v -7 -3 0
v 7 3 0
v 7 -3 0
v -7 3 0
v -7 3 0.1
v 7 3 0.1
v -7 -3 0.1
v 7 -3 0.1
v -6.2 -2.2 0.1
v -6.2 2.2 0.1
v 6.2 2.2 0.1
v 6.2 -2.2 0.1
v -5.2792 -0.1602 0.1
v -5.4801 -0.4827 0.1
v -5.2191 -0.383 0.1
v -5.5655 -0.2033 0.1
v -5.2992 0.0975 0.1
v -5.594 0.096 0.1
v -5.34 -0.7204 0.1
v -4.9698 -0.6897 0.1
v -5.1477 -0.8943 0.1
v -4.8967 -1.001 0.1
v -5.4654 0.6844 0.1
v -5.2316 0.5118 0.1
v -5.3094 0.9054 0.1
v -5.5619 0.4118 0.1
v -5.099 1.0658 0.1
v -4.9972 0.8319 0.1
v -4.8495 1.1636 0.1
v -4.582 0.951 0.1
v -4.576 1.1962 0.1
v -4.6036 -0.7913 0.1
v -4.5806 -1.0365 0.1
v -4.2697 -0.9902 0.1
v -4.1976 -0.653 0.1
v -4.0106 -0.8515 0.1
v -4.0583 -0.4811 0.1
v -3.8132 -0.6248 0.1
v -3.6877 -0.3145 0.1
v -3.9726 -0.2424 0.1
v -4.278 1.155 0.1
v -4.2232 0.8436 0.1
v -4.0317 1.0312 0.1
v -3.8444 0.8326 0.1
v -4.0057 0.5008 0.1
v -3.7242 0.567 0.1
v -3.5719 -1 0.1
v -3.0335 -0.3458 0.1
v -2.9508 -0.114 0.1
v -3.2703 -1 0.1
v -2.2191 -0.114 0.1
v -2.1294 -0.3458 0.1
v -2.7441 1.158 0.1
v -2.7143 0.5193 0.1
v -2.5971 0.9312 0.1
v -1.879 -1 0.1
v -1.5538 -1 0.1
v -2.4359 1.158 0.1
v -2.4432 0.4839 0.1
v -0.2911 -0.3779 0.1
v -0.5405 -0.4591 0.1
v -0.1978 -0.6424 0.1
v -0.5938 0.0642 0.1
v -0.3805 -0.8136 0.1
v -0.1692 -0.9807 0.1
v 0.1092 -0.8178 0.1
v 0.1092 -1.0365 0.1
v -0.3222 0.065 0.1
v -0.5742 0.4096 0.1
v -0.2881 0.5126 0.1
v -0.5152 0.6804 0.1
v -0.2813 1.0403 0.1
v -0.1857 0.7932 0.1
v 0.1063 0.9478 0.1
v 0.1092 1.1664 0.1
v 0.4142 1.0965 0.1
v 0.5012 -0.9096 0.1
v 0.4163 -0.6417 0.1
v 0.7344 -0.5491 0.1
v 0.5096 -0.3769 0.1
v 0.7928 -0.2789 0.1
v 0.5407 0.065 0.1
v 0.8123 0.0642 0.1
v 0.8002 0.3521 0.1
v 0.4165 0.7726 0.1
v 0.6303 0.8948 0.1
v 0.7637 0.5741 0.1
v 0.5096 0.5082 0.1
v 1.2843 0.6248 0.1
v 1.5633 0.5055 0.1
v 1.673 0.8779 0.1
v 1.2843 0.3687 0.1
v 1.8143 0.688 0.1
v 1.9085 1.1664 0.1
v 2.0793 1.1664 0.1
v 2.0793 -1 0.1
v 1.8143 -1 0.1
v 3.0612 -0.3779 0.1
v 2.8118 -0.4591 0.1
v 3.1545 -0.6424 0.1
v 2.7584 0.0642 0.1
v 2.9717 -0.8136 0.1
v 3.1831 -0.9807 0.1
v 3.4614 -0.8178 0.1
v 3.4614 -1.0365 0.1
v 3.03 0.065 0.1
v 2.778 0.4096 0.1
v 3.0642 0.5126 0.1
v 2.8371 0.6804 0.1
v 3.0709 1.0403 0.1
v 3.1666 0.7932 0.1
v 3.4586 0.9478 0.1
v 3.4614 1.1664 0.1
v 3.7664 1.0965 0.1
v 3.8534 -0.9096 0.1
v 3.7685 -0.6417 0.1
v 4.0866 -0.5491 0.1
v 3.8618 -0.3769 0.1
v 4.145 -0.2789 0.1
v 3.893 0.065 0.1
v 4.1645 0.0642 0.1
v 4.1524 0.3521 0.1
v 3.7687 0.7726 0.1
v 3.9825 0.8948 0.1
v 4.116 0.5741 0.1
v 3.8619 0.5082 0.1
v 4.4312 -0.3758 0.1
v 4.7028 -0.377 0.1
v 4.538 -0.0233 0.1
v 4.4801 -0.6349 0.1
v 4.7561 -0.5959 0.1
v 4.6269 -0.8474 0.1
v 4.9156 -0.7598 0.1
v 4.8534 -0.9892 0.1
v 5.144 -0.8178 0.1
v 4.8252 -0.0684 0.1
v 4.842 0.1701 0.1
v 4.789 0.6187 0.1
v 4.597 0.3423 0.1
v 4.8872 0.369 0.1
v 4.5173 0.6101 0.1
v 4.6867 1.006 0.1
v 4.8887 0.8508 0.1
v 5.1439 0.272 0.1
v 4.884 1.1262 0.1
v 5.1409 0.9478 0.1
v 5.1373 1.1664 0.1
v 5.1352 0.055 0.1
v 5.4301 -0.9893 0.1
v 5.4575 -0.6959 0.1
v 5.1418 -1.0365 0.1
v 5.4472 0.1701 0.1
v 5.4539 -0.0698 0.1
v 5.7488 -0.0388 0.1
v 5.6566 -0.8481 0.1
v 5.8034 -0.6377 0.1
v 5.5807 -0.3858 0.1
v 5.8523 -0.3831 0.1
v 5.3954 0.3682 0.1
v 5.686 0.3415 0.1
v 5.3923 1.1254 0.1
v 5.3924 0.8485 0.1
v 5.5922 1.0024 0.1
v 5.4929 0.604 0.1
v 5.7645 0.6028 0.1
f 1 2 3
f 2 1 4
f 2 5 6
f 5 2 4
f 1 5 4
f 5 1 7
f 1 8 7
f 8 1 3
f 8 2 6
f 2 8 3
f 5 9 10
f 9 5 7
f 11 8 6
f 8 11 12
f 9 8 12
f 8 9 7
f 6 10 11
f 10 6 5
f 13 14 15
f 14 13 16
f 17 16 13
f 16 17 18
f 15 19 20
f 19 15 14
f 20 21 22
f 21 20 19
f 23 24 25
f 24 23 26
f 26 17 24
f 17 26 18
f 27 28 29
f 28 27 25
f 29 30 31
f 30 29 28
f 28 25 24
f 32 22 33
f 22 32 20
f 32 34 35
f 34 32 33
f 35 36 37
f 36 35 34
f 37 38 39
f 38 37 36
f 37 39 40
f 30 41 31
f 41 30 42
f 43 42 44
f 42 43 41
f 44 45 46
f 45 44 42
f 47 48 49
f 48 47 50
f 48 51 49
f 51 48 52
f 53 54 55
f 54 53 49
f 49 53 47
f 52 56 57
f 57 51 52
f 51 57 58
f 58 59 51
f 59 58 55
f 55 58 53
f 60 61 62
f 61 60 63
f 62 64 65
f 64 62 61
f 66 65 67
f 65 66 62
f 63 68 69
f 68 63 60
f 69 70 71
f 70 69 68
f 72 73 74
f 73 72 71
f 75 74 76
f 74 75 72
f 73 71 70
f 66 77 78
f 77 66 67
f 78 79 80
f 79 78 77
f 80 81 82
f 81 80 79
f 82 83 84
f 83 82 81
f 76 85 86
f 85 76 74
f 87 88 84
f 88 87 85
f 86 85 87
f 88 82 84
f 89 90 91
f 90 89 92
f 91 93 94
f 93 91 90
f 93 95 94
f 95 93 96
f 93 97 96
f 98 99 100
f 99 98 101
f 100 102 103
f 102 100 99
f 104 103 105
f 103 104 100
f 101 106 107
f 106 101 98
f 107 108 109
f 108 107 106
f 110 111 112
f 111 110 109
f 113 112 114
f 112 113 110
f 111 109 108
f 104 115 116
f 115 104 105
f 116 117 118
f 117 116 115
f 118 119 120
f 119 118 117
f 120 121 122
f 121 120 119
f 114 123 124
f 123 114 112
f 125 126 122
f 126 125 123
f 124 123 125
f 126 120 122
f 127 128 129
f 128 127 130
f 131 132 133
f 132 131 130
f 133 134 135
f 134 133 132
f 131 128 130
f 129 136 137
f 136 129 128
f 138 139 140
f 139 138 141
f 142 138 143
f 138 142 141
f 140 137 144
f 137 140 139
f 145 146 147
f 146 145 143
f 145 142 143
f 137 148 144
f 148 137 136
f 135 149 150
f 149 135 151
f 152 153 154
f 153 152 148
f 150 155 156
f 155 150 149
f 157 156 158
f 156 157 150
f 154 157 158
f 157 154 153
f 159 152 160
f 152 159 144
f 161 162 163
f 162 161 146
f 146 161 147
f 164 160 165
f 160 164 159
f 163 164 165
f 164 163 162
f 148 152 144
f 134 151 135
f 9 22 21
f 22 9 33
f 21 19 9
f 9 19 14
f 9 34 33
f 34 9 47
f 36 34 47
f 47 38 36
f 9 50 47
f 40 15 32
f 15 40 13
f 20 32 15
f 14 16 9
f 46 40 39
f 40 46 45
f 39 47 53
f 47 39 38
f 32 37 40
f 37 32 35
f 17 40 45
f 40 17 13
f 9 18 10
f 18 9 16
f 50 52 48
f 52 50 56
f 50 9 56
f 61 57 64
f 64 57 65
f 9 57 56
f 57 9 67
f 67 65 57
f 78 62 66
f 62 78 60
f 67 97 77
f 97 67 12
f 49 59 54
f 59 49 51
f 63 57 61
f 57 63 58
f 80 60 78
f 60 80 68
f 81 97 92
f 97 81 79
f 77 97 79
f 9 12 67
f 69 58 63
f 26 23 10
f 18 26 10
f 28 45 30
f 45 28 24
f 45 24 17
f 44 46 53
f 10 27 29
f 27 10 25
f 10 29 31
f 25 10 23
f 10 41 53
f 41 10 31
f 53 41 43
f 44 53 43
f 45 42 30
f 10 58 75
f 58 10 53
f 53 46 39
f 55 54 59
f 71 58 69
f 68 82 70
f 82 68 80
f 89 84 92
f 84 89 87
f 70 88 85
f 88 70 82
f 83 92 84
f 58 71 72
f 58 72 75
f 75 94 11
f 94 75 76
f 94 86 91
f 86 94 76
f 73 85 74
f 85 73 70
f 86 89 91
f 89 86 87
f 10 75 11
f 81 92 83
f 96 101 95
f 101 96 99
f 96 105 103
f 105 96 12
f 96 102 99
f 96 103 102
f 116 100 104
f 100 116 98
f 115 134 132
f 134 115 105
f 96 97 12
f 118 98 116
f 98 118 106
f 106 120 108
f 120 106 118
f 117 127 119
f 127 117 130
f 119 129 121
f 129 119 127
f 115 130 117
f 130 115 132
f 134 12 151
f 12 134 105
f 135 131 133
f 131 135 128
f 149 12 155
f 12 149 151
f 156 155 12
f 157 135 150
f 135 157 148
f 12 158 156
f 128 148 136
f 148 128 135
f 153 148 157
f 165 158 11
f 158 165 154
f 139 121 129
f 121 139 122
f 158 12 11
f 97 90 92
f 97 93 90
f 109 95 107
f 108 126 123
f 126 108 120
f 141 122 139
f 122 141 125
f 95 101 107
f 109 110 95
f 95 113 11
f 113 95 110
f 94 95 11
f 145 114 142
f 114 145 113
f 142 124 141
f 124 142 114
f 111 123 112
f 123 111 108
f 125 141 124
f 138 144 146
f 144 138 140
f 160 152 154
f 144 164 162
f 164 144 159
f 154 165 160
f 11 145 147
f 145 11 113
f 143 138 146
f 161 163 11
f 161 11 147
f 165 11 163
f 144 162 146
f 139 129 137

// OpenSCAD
// file: ../p/box5-12.scad
use <../lib.scad>
function ldraw_lib__box5_12() = [
// 0 Box with 5 Faces without Any Edges
// 0 Name: box5-12.dat
// 0 Author: Chris Dee [cwdee]
// 0 !LDRAW_ORG Primitive UPDATE 2009-02
// 0 !LICENSE Licensed under CC BY 2.0 and CC BY 4.0 : see CAreadme.txt
// 
// 0 BFC CERTIFY CCW
  [0,"BFC","CERTIFY"],
  [0,"BFC","CCW"],
// 
// 0 !HISTORY 2009-09-03 [PTadmin] Official Update 2009-02
// 
// 
// 4 16 1 1 1 1 1 -1 -1 1 -1 -1 1 1
  [4,16,1,1,1,1,1,-1,-1,1,-1,-1,1,1],
// 4 16 -1 0 1 1 0 1 1 1 1 -1 1 1
  [4,16,-1,0,1,1,0,1,1,1,1,-1,1,1],
// 4 16 -1 0 -1 -1 0 1 -1 1 1 -1 1 -1
  [4,16,-1,0,-1,-1,0,1,-1,1,1,-1,1,-1],
// 4 16 1 0 -1 -1 0 -1 -1 1 -1 1 1 -1
  [4,16,1,0,-1,-1,0,-1,-1,1,-1,1,1,-1],
// 4 16 1 0 1 1 0 -1 1 1 -1 1 1 1
  [4,16,1,0,1,1,0,-1,1,1,-1,1,1,1],
// 0
];
module ldraw_lib__box5_12(step=0, col=false, unit=2/5, alt=false, line=0.2, solid=!$preview)
    makepoly(ldraw_lib__box5_12(), step=step, col=col, unit=unit, alt=alt, line=line, solid=solid);
ldraw_lib__box5_12(line=0.2);
// main file
use <../lib.scad>
use <../p/box5-12.scad>
function ldraw_lib__4521703f() = [
// 0 Sticker  0.8 x  1.8 with Black "CA 0108" and Border
// 0 Name: 4521703f.dat
// 0 Author: J.C. Tchang [tchang]
// 0 !LDRAW_ORG Part UPDATE 2012-01
// 0 !LICENSE Licensed under CC BY 2.0 and CC BY 4.0 : see CAreadme.txt
// 
// 0 BFC CERTIFY CCW
  [0,"BFC","CERTIFY"],
  [0,"BFC","CCW"],
// 
// 0 !HISTORY 2011-07-25 [PTadmin] Official Update 2011-01
// 0 !HISTORY 2012-01-09 [cwdee] Corrected dimensions
// 0 !HISTORY 2012-03-30 [PTadmin] Official Update 2012-01
// 
// 
// 1 16 0 -0.25 0 17.5 0 0 0 0.25 0 0 0 7.5 box5-12.dat
  [1,16,0,-0.25,0,17.5,0,0,0,0.25,0,0,0,7.5, ldraw_lib__box5_12()],
// 4 0 -15.5 -0.25 -5.5 -15.5 -0.25 5.5 -17.5 -0.25 7.5 -17.5 -0.25 -7.5
  [4,0,-15.5,-0.25,-5.5,-15.5,-0.25,5.5,-17.5,-0.25,7.5,-17.5,-0.25,-7.5],
// 4 0 15.5 -0.25 5.5 15.5 -0.25 -5.5 17.5 -0.25 -7.5 17.5 -0.25 7.5
  [4,0,15.5,-0.25,5.5,15.5,-0.25,-5.5,17.5,-0.25,-7.5,17.5,-0.25,7.5],
// 4 0 15.5 -0.25 -5.5 -15.5 -0.25 -5.5 -17.5 -0.25 -7.5 17.5 -0.25 -7.5
  [4,0,15.5,-0.25,-5.5,-15.5,-0.25,-5.5,-17.5,-0.25,-7.5,17.5,-0.25,-7.5],
// 4 0 -15.5 -0.25 5.5 15.5 -0.25 5.5 17.5 -0.25 7.5 -17.5 -0.25 7.5
  [4,0,-15.5,-0.25,5.5,15.5,-0.25,5.5,17.5,-0.25,7.5,-17.5,-0.25,7.5],
// 0 //
// 4 0 -13.7002 -0.25 -1.2068 -13.0478 -0.25 -0.9574 -13.198 -0.25 -0.4004 -13.9138 -0.25 -0.5083
  [4,0,-13.7002,-0.25,-1.2068,-13.0478,-0.25,-0.9574,-13.198,-0.25,-0.4004,-13.9138,-0.25,-0.5083],
// 4 0 -13.9138 -0.25 -0.5083 -13.198 -0.25 -0.4004 -13.2481 -0.25 0.2438 -13.9851 -0.25 0.2401
  [4,0,-13.9138,-0.25,-0.5083,-13.198,-0.25,-0.4004,-13.2481,-0.25,0.2438,-13.9851,-0.25,0.2401],
// 4 0 -13.0478 -0.25 -0.9574 -13.7002 -0.25 -1.2068 -13.3499 -0.25 -1.8009 -12.4245 -0.25 -1.7243
  [4,0,-13.0478,-0.25,-0.9574,-13.7002,-0.25,-1.2068,-13.3499,-0.25,-1.8009,-12.4245,-0.25,-1.7243],
// 4 0 -12.8692 -0.25 -2.2358 -12.2417 -0.25 -2.5024 -12.4245 -0.25 -1.7243 -13.3499 -0.25 -1.8009
  [4,0,-12.8692,-0.25,-2.2358,-12.2417,-0.25,-2.5024,-12.4245,-0.25,-1.7243,-13.3499,-0.25,-1.8009],
// 4 0 -13.6634 -0.25 1.7111 -13.9048 -0.25 1.0295 -13.0791 -0.25 1.2794 -13.2736 -0.25 2.2634
  [4,0,-13.6634,-0.25,1.7111,-13.9048,-0.25,1.0295,-13.0791,-0.25,1.2794,-13.2736,-0.25,2.2634],
// 4 0 -13.9048 -0.25 1.0295 -13.9851 -0.25 0.2401 -13.2481 -0.25 0.2438 -13.0791 -0.25 1.2794
  [4,0,-13.9048,-0.25,1.0295,-13.9851,-0.25,0.2401,-13.2481,-0.25,0.2438,-13.0791,-0.25,1.2794],
// 4 0 -12.4929 -0.25 2.0797 -12.1237 -0.25 2.9089 -12.7475 -0.25 2.6646 -13.2736 -0.25 2.2634
  [4,0,-12.4929,-0.25,2.0797,-12.1237,-0.25,2.9089,-12.7475,-0.25,2.6646,-13.2736,-0.25,2.2634],
// 4 0 -12.1237 -0.25 2.9089 -12.4929 -0.25 2.0797 -11.4549 -0.25 2.3776 -11.44 -0.25 2.9905
  [4,0,-12.1237,-0.25,2.9089,-12.4929,-0.25,2.0797,-11.4549,-0.25,2.3776,-11.44,-0.25,2.9905],
// 3 0 -12.4929 -0.25 2.0797 -13.2736 -0.25 2.2634 -13.0791 -0.25 1.2794
  [3,0,-12.4929,-0.25,2.0797,-13.2736,-0.25,2.2634,-13.0791,-0.25,1.2794],
// 4 0 -11.5089 -0.25 -1.9782 -12.4245 -0.25 -1.7243 -12.2417 -0.25 -2.5024 -11.4514 -0.25 -2.5912
  [4,0,-11.5089,-0.25,-1.9782,-12.4245,-0.25,-1.7243,-12.2417,-0.25,-2.5024,-11.4514,-0.25,-2.5912],
// 4 0 -11.5089 -0.25 -1.9782 -11.4514 -0.25 -2.5912 -10.6742 -0.25 -2.4754 -10.494 -0.25 -1.6324
  [4,0,-11.5089,-0.25,-1.9782,-11.4514,-0.25,-2.5912,-10.6742,-0.25,-2.4754,-10.494,-0.25,-1.6324],
// 4 0 -10.494 -0.25 -1.6324 -10.6742 -0.25 -2.4754 -10.0265 -0.25 -2.1287 -10.1458 -0.25 -1.2028
  [4,0,-10.494,-0.25,-1.6324,-10.6742,-0.25,-2.4754,-10.0265,-0.25,-2.1287,-10.1458,-0.25,-1.2028],
// 4 0 -10.1458 -0.25 -1.2028 -10.0265 -0.25 -2.1287 -9.5331 -0.25 -1.5619 -9.2193 -0.25 -0.7862
  [4,0,-10.1458,-0.25,-1.2028,-10.0265,-0.25,-2.1287,-9.5331,-0.25,-1.5619,-9.2193,-0.25,-0.7862],
// 3 0 -10.1458 -0.25 -1.2028 -9.2193 -0.25 -0.7862 -9.9314 -0.25 -0.606
  [3,0,-10.1458,-0.25,-1.2028,-9.2193,-0.25,-0.7862,-9.9314,-0.25,-0.606],
// 4 0 -11.4549 -0.25 2.3776 -10.5581 -0.25 2.1091 -10.6951 -0.25 2.8874 -11.44 -0.25 2.9905
  [4,0,-11.4549,-0.25,2.3776,-10.5581,-0.25,2.1091,-10.6951,-0.25,2.8874,-11.44,-0.25,2.9905],
// 4 0 -10.0793 -0.25 2.5779 -10.6951 -0.25 2.8874 -10.5581 -0.25 2.1091 -9.611 -0.25 2.0816
  [4,0,-10.0793,-0.25,2.5779,-10.6951,-0.25,2.8874,-10.5581,-0.25,2.1091,-9.611,-0.25,2.0816],
// 4 0 -9.611 -0.25 2.0816 -10.5581 -0.25 2.1091 -10.0143 -0.25 1.2519 -9.3105 -0.25 1.4175
  [4,0,-9.611,-0.25,2.0816,-10.5581,-0.25,2.1091,-10.0143,-0.25,1.2519,-9.3105,-0.25,1.4175],
// 4 0 -8.9297 -0.25 -2.5 -8.1758 -0.25 -2.5 -7.5837 -0.25 -0.8644 -7.377 -0.25 -0.2849
  [4,0,-8.9297,-0.25,-2.5,-8.1758,-0.25,-2.5,-7.5837,-0.25,-0.8644,-7.377,-0.25,-0.2849],
// 4 0 -5.5478 -0.25 -0.2849 -7.377 -0.25 -0.2849 -7.5837 -0.25 -0.8644 -5.3236 -0.25 -0.8644
  [4,0,-5.5478,-0.25,-0.2849,-7.377,-0.25,-0.2849,-7.5837,-0.25,-0.8644,-5.3236,-0.25,-0.8644],
// 4 0 -6.8603 -0.25 2.8951 -7.377 -0.25 -0.2849 -6.7858 -0.25 1.2982 -6.4927 -0.25 2.328
  [4,0,-6.8603,-0.25,2.8951,-7.377,-0.25,-0.2849,-6.7858,-0.25,1.2982,-6.4927,-0.25,2.328],
// 3 0 -7.377 -0.25 -0.2849 -6.8603 -0.25 2.8951 -8.9297 -0.25 -2.5
  [3,0,-7.377,-0.25,-0.2849,-6.8603,-0.25,2.8951,-8.9297,-0.25,-2.5],
// 3 0 -5.3236 -0.25 -0.8644 -4.6976 -0.25 -2.5 -3.8846 -0.25 -2.5
  [3,0,-5.3236,-0.25,-0.8644,-4.6976,-0.25,-2.5,-3.8846,-0.25,-2.5],
// 4 0 -5.5478 -0.25 -0.2849 -5.3236 -0.25 -0.8644 -3.8846 -0.25 -2.5 -6.0897 -0.25 2.8951
  [4,0,-5.5478,-0.25,-0.2849,-5.3236,-0.25,-0.8644,-3.8846,-0.25,-2.5,-6.0897,-0.25,2.8951],
// 4 0 -6.0897 -0.25 2.8951 -6.4927 -0.25 2.328 -6.108 -0.25 1.2097 -5.5478 -0.25 -0.2849
  [4,0,-6.0897,-0.25,2.8951,-6.4927,-0.25,2.328,-6.108,-0.25,1.2097,-5.5478,-0.25,-0.2849],
// 3 0 -6.4927 -0.25 2.328 -6.0897 -0.25 2.8951 -6.8603 -0.25 2.8951
  [3,0,-6.4927,-0.25,2.328,-6.0897,-0.25,2.8951,-6.8603,-0.25,2.8951],
// 4 0 -0.7277 -0.25 -0.9447 -1.4845 -0.25 0.1606 -1.3512 -0.25 -1.1477 -0.4945 -0.25 -1.6059
  [4,0,-0.7277,-0.25,-0.9447,-1.4845,-0.25,0.1606,-1.3512,-0.25,-1.1477,-0.4945,-0.25,-1.6059],
// 4 0 -0.4945 -0.25 -1.6059 -1.3512 -0.25 -1.1477 -0.9513 -0.25 -2.0339 -0.4229 -0.25 -2.4518
  [4,0,-0.4945,-0.25,-1.6059,-1.3512,-0.25,-1.1477,-0.9513,-0.25,-2.0339,-0.4229,-0.25,-2.4518],
// 4 0 0.273 -0.25 -2.0445 -0.4945 -0.25 -1.6059 -0.4229 -0.25 -2.4518 0.273 -0.25 -2.5912
  [4,0,0.273,-0.25,-2.0445,-0.4945,-0.25,-1.6059,-0.4229,-0.25,-2.4518,0.273,-0.25,-2.5912],
// 4 0 -1.4845 -0.25 0.1606 -0.7277 -0.25 -0.9447 -0.8056 -0.25 0.1625 -1.4355 -0.25 1.024
  [4,0,-1.4845,-0.25,0.1606,-0.7277,-0.25,-0.9447,-0.8056,-0.25,0.1625,-1.4355,-0.25,1.024],
// 4 0 -0.7203 -0.25 1.2815 -1.2879 -0.25 1.701 -1.4355 -0.25 1.024 -0.8056 -0.25 0.1625
  [4,0,-0.7203,-0.25,1.2815,-1.2879,-0.25,1.701,-1.4355,-0.25,1.024,-0.8056,-0.25,0.1625],
// 4 0 -0.7033 -0.25 2.6007 -1.2879 -0.25 1.701 -0.4643 -0.25 1.983 0.2658 -0.25 2.3694
  [4,0,-0.7033,-0.25,2.6007,-1.2879,-0.25,1.701,-0.4643,-0.25,1.983,0.2658,-0.25,2.3694],
// 4 0 0.273 -0.25 2.9161 -0.7033 -0.25 2.6007 0.2658 -0.25 2.3694 1.0354 -0.25 2.7412
  [4,0,0.273,-0.25,2.9161,-0.7033,-0.25,2.6007,0.2658,-0.25,2.3694,1.0354,-0.25,2.7412],
// 3 0 -0.4643 -0.25 1.983 -1.2879 -0.25 1.701 -0.7203 -0.25 1.2815
  [3,0,-0.4643,-0.25,1.983,-1.2879,-0.25,1.701,-0.7203,-0.25,1.2815],
// 4 0 1.2529 -0.25 -2.274 1.0407 -0.25 -1.6043 0.273 -0.25 -2.0445 0.273 -0.25 -2.5912
  [4,0,1.2529,-0.25,-2.274,1.0407,-0.25,-1.6043,0.273,-0.25,-2.0445,0.273,-0.25,-2.5912],
// 4 0 1.0407 -0.25 -1.6043 1.2529 -0.25 -2.274 1.8359 -0.25 -1.3727 1.2739 -0.25 -0.9423
  [4,0,1.0407,-0.25,-1.6043,1.2529,-0.25,-2.274,1.8359,-0.25,-1.3727,1.2739,-0.25,-0.9423],
// 4 0 1.2739 -0.25 -0.9423 1.8359 -0.25 -1.3727 1.982 -0.25 -0.6972 1.3518 -0.25 0.1625
  [4,0,1.2739,-0.25,-0.9423,1.8359,-0.25,-1.3727,1.982,-0.25,-0.6972,1.3518,-0.25,0.1625],
// 4 0 1.3518 -0.25 0.1625 1.982 -0.25 -0.6972 2.0307 -0.25 0.1606 2.0005 -0.25 0.8803
  [4,0,1.3518,-0.25,0.1625,1.982,-0.25,-0.6972,2.0307,-0.25,0.1606,2.0005,-0.25,0.8803],
// 4 0 1.0412 -0.25 1.9316 1.5757 -0.25 2.2371 1.0354 -0.25 2.7412 0.2658 -0.25 2.3694
  [4,0,1.0412,-0.25,1.9316,1.5757,-0.25,2.2371,1.0354,-0.25,2.7412,0.2658,-0.25,2.3694],
// 4 0 1.9093 -0.25 1.4353 1.0412 -0.25 1.9316 1.2741 -0.25 1.2704 2.0005 -0.25 0.8803
  [4,0,1.9093,-0.25,1.4353,1.0412,-0.25,1.9316,1.2741,-0.25,1.2704,2.0005,-0.25,0.8803],
// 3 0 1.5757 -0.25 2.2371 1.0412 -0.25 1.9316 1.9093 -0.25 1.4353
  [3,0,1.5757,-0.25,2.2371,1.0412,-0.25,1.9316,1.9093,-0.25,1.4353],
// 3 0 1.2741 -0.25 1.2704 1.3518 -0.25 0.1625 2.0005 -0.25 0.8803
  [3,0,1.2741,-0.25,1.2704,1.3518,-0.25,0.1625,2.0005,-0.25,0.8803],
// 4 0 3.2108 -0.25 1.5619 3.2108 -0.25 0.9217 3.9082 -0.25 1.2638 4.1825 -0.25 2.1947
  [4,0,3.2108,-0.25,1.5619,3.2108,-0.25,0.9217,3.9082,-0.25,1.2638,4.1825,-0.25,2.1947],
// 4 0 4.1825 -0.25 2.1947 3.9082 -0.25 1.2638 4.5358 -0.25 1.7201 4.7713 -0.25 2.9161
  [4,0,4.1825,-0.25,2.1947,3.9082,-0.25,1.2638,4.5358,-0.25,1.7201,4.7713,-0.25,2.9161],
// 4 0 5.1983 -0.25 2.9161 4.7713 -0.25 2.9161 4.5358 -0.25 1.7201 5.1983 -0.25 -2.5
  [4,0,5.1983,-0.25,2.9161,4.7713,-0.25,2.9161,4.5358,-0.25,1.7201,5.1983,-0.25,-2.5],
// 3 0 4.5358 -0.25 1.7201 4.5358 -0.25 -2.5 5.1983 -0.25 -2.5
  [3,0,4.5358,-0.25,1.7201,4.5358,-0.25,-2.5,5.1983,-0.25,-2.5],
// 4 0 7.653 -0.25 -0.9447 6.8961 -0.25 0.1606 7.0294 -0.25 -1.1477 7.8862 -0.25 -1.6059
  [4,0,7.653,-0.25,-0.9447,6.8961,-0.25,0.1606,7.0294,-0.25,-1.1477,7.8862,-0.25,-1.6059],
// 4 0 7.8862 -0.25 -1.6059 7.0294 -0.25 -1.1477 7.4293 -0.25 -2.0339 7.9577 -0.25 -2.4518
  [4,0,7.8862,-0.25,-1.6059,7.0294,-0.25,-1.1477,7.4293,-0.25,-2.0339,7.9577,-0.25,-2.4518],
// 4 0 8.6536 -0.25 -2.0445 7.8862 -0.25 -1.6059 7.9577 -0.25 -2.4518 8.6536 -0.25 -2.5912
  [4,0,8.6536,-0.25,-2.0445,7.8862,-0.25,-1.6059,7.9577,-0.25,-2.4518,8.6536,-0.25,-2.5912],
// 4 0 6.8961 -0.25 0.1606 7.653 -0.25 -0.9447 7.575 -0.25 0.1625 6.9451 -0.25 1.024
  [4,0,6.8961,-0.25,0.1606,7.653,-0.25,-0.9447,7.575,-0.25,0.1625,6.9451,-0.25,1.024],
// 4 0 7.6604 -0.25 1.2815 7.0927 -0.25 1.701 6.9451 -0.25 1.024 7.575 -0.25 0.1625
  [4,0,7.6604,-0.25,1.2815,7.0927,-0.25,1.701,6.9451,-0.25,1.024,7.575,-0.25,0.1625],
// 4 0 7.6773 -0.25 2.6007 7.0927 -0.25 1.701 7.9164 -0.25 1.983 8.6464 -0.25 2.3694
  [4,0,7.6773,-0.25,2.6007,7.0927,-0.25,1.701,7.9164,-0.25,1.983,8.6464,-0.25,2.3694],
// 4 0 8.6536 -0.25 2.9161 7.6773 -0.25 2.6007 8.6464 -0.25 2.3694 9.416 -0.25 2.7412
  [4,0,8.6536,-0.25,2.9161,7.6773,-0.25,2.6007,8.6464,-0.25,2.3694,9.416,-0.25,2.7412],
// 3 0 7.9164 -0.25 1.983 7.0927 -0.25 1.701 7.6604 -0.25 1.2815
  [3,0,7.9164,-0.25,1.983,7.0927,-0.25,1.701,7.6604,-0.25,1.2815],
// 4 0 9.6336 -0.25 -2.274 9.4213 -0.25 -1.6043 8.6536 -0.25 -2.0445 8.6536 -0.25 -2.5912
  [4,0,9.6336,-0.25,-2.274,9.4213,-0.25,-1.6043,8.6536,-0.25,-2.0445,8.6536,-0.25,-2.5912],
// 4 0 9.4213 -0.25 -1.6043 9.6336 -0.25 -2.274 10.2166 -0.25 -1.3727 9.6545 -0.25 -0.9423
  [4,0,9.4213,-0.25,-1.6043,9.6336,-0.25,-2.274,10.2166,-0.25,-1.3727,9.6545,-0.25,-0.9423],
// 4 0 9.6545 -0.25 -0.9423 10.2166 -0.25 -1.3727 10.3626 -0.25 -0.6972 9.7324 -0.25 0.1625
  [4,0,9.6545,-0.25,-0.9423,10.2166,-0.25,-1.3727,10.3626,-0.25,-0.6972,9.7324,-0.25,0.1625],
// 4 0 9.7324 -0.25 0.1625 10.3626 -0.25 -0.6972 10.4113 -0.25 0.1606 10.3811 -0.25 0.8803
  [4,0,9.7324,-0.25,0.1625,10.3626,-0.25,-0.6972,10.4113,-0.25,0.1606,10.3811,-0.25,0.8803],
// 4 0 9.4218 -0.25 1.9316 9.9563 -0.25 2.2371 9.416 -0.25 2.7412 8.6464 -0.25 2.3694
  [4,0,9.4218,-0.25,1.9316,9.9563,-0.25,2.2371,9.416,-0.25,2.7412,8.6464,-0.25,2.3694],
// 4 0 10.29 -0.25 1.4353 9.4218 -0.25 1.9316 9.6548 -0.25 1.2704 10.3811 -0.25 0.8803
  [4,0,10.29,-0.25,1.4353,9.4218,-0.25,1.9316,9.6548,-0.25,1.2704,10.3811,-0.25,0.8803],
// 3 0 9.9563 -0.25 2.2371 9.4218 -0.25 1.9316 10.29 -0.25 1.4353
  [3,0,9.9563,-0.25,2.2371,9.4218,-0.25,1.9316,10.29,-0.25,1.4353],
// 3 0 9.6548 -0.25 1.2704 9.7324 -0.25 0.1625 10.3811 -0.25 0.8803
  [3,0,9.6548,-0.25,1.2704,9.7324,-0.25,0.1625,10.3811,-0.25,0.8803],
// 4 0 11.0781 -0.25 -0.9394 11.2002 -0.25 -1.5873 11.757 -0.25 -0.9426 11.3449 -0.25 -0.0583
  [4,0,11.0781,-0.25,-0.9394,11.2002,-0.25,-1.5873,11.757,-0.25,-0.9426,11.3449,-0.25,-0.0583],
// 4 0 11.8903 -0.25 -1.4898 11.2002 -0.25 -1.5873 11.5673 -0.25 -2.1184 12.2891 -0.25 -1.8995
  [4,0,11.8903,-0.25,-1.4898,11.2002,-0.25,-1.5873,11.5673,-0.25,-2.1184,12.2891,-0.25,-1.8995],
// 4 0 12.1336 -0.25 -2.473 12.8599 -0.25 -2.0445 12.2891 -0.25 -1.8995 11.5673 -0.25 -2.1184
  [4,0,12.1336,-0.25,-2.473,12.8599,-0.25,-2.0445,12.2891,-0.25,-1.8995,11.5673,-0.25,-2.1184],
// 3 0 11.8903 -0.25 -1.4898 11.757 -0.25 -0.9426 11.2002 -0.25 -1.5873
  [3,0,11.8903,-0.25,-1.4898,11.757,-0.25,-0.9426,11.2002,-0.25,-1.5873],
// 4 0 11.3449 -0.25 -0.0583 11.757 -0.25 -0.9426 12.0631 -0.25 -0.1709 12.105 -0.25 0.4253
  [4,0,11.3449,-0.25,-0.0583,11.757,-0.25,-0.9426,12.0631,-0.25,-0.1709,12.105,-0.25,0.4253],
// 4 0 11.4925 -0.25 0.8557 12.2181 -0.25 0.9225 11.9725 -0.25 1.5468 11.2933 -0.25 1.5253
  [4,0,11.4925,-0.25,0.8557,12.2181,-0.25,0.9225,11.9725,-0.25,1.5468,11.2933,-0.25,1.5253],
// 4 0 11.7167 -0.25 2.5149 11.2933 -0.25 1.5253 11.9725 -0.25 1.5468 12.2218 -0.25 2.1269
  [4,0,11.7167,-0.25,2.5149,11.2933,-0.25,1.5253,11.9725,-0.25,1.5468,12.2218,-0.25,2.1269],
// 4 0 12.2181 -0.25 0.9225 11.4925 -0.25 0.8557 12.105 -0.25 0.4253 12.8597 -0.25 0.68
  [4,0,12.2181,-0.25,0.9225,11.4925,-0.25,0.8557,12.105,-0.25,0.4253,12.8597,-0.25,0.68],
// 4 0 12.8523 -0.25 2.3694 12.8432 -0.25 2.9161 12.2099 -0.25 2.8156 12.2218 -0.25 2.1269
  [4,0,12.8523,-0.25,2.3694,12.8432,-0.25,2.9161,12.2099,-0.25,2.8156,12.2218,-0.25,2.1269],
// 3 0 12.2099 -0.25 2.8156 11.7167 -0.25 2.5149 12.2218 -0.25 2.1269
  [3,0,12.2099,-0.25,2.8156,11.7167,-0.25,2.5149,12.2218,-0.25,2.1269],
// 4 0 12.8379 -0.25 0.1375 12.8597 -0.25 0.68 12.105 -0.25 0.4253 12.0631 -0.25 -0.1709
  [4,0,12.8379,-0.25,0.1375,12.8597,-0.25,0.68,12.105,-0.25,0.4253,12.0631,-0.25,-0.1709],
// 4 0 12.8599 -0.25 -2.0445 12.8544 -0.25 -2.5912 13.5752 -0.25 -2.4732 13.6438 -0.25 -1.7397
  [4,0,12.8599,-0.25,-2.0445,12.8544,-0.25,-2.5912,13.5752,-0.25,-2.4732,13.6438,-0.25,-1.7397],
// 4 0 13.6181 -0.25 0.4253 12.8379 -0.25 0.1375 13.6348 -0.25 -0.1746 14.372 -0.25 -0.097
  [4,0,13.6181,-0.25,0.4253,12.8379,-0.25,0.1375,13.6348,-0.25,-0.1746,14.372,-0.25,-0.097],
// 4 0 13.6438 -0.25 -1.7397 13.5752 -0.25 -2.4732 14.1415 -0.25 -2.1203 14.5085 -0.25 -1.5942
  [4,0,13.6438,-0.25,-1.7397,13.5752,-0.25,-2.4732,14.1415,-0.25,-2.1203,14.5085,-0.25,-1.5942],
// 4 0 13.9517 -0.25 -0.9646 13.6438 -0.25 -1.7397 14.5085 -0.25 -1.5942 14.6307 -0.25 -0.9577
  [4,0,13.9517,-0.25,-0.9646,13.6438,-0.25,-1.7397,14.5085,-0.25,-1.5942,14.6307,-0.25,-0.9577],
// 4 0 13.9517 -0.25 -0.9646 14.6307 -0.25 -0.9577 14.372 -0.25 -0.097 13.6348 -0.25 -0.1746
  [4,0,13.9517,-0.25,-0.9646,14.6307,-0.25,-0.9577,14.372,-0.25,-0.097,13.6348,-0.25,-0.1746],
// 4 0 13.4885 -0.25 0.9206 12.8597 -0.25 0.68 13.6181 -0.25 0.4253 14.2149 -0.25 0.8538
  [4,0,13.4885,-0.25,0.9206,12.8597,-0.25,0.68,13.6181,-0.25,0.4253,14.2149,-0.25,0.8538],
// 4 0 13.4808 -0.25 2.8135 12.8523 -0.25 2.3694 13.4811 -0.25 2.1213 13.9806 -0.25 2.5059
  [4,0,13.4808,-0.25,2.8135,12.8523,-0.25,2.3694,13.4811,-0.25,2.1213,13.9806,-0.25,2.5059],
// 3 0 12.8523 -0.25 2.3694 13.4808 -0.25 2.8135 12.8432 -0.25 2.9161
  [3,0,12.8523,-0.25,2.3694,13.4808,-0.25,2.8135,12.8432,-0.25,2.9161],
// 4 0 13.7323 -0.25 1.51 13.4885 -0.25 0.9206 14.2149 -0.25 0.8538 14.4113 -0.25 1.5071
  [4,0,13.7323,-0.25,1.51,13.4885,-0.25,0.9206,14.2149,-0.25,0.8538,14.4113,-0.25,1.5071],
// 4 0 13.7323 -0.25 1.51 14.4113 -0.25 1.5071 13.9806 -0.25 2.5059 13.4811 -0.25 2.1213
  [4,0,13.7323,-0.25,1.51,14.4113,-0.25,1.5071,13.9806,-0.25,2.5059,13.4811,-0.25,2.1213],
// 3 0 12.8379 -0.25 0.1375 13.6181 -0.25 0.4253 12.8597 -0.25 0.68
  [3,0,12.8379,-0.25,0.1375,13.6181,-0.25,0.4253,12.8597,-0.25,0.68],
// 3 0 12.1336 -0.25 -2.473 12.8544 -0.25 -2.5912 12.8599 -0.25 -2.0445
  [3,0,12.1336,-0.25,-2.473,12.8544,-0.25,-2.5912,12.8599,-0.25,-2.0445],
// 3 15 -15.5 -0.25 -5.5 -12.2417 -0.25 -2.5024 -12.8692 -0.25 -2.2358
  [3,15,-15.5,-0.25,-5.5,-12.2417,-0.25,-2.5024,-12.8692,-0.25,-2.2358],
// 3 15 -12.2417 -0.25 -2.5024 -15.5 -0.25 -5.5 -11.4514 -0.25 -2.5912
  [3,15,-12.2417,-0.25,-2.5024,-15.5,-0.25,-5.5,-11.4514,-0.25,-2.5912],
// 3 15 -12.8692 -0.25 -2.2358 -13.3499 -0.25 -1.8009 -15.5 -0.25 -5.5
  [3,15,-12.8692,-0.25,-2.2358,-13.3499,-0.25,-1.8009,-15.5,-0.25,-5.5],
// 3 15 -15.5 -0.25 -5.5 -13.3499 -0.25 -1.8009 -13.7002 -0.25 -1.2068
  [3,15,-15.5,-0.25,-5.5,-13.3499,-0.25,-1.8009,-13.7002,-0.25,-1.2068],
// 4 15 -8.9297 -0.25 -2.5 -10.6742 -0.25 -2.4754 -11.4514 -0.25 -2.5912 -15.5 -0.25 -5.5
  [4,15,-8.9297,-0.25,-2.5,-10.6742,-0.25,-2.4754,-11.4514,-0.25,-2.5912,-15.5,-0.25,-5.5],
// 3 15 -10.0265 -0.25 -2.1287 -10.6742 -0.25 -2.4754 -8.9297 -0.25 -2.5
  [3,15,-10.0265,-0.25,-2.1287,-10.6742,-0.25,-2.4754,-8.9297,-0.25,-2.5],
// 3 15 -8.9297 -0.25 -2.5 -9.5331 -0.25 -1.5619 -10.0265 -0.25 -2.1287
  [3,15,-8.9297,-0.25,-2.5,-9.5331,-0.25,-1.5619,-10.0265,-0.25,-2.1287],
// 3 15 -15.5 -0.25 -5.5 -8.1758 -0.25 -2.5 -8.9297 -0.25 -2.5
  [3,15,-15.5,-0.25,-5.5,-8.1758,-0.25,-2.5,-8.9297,-0.25,-2.5],
// 4 15 -9.9314 -0.25 -0.606 -13.198 -0.25 -0.4004 -13.0478 -0.25 -0.9574 -11.5089 -0.25 -1.9782
  [4,15,-9.9314,-0.25,-0.606,-13.198,-0.25,-0.4004,-13.0478,-0.25,-0.9574,-11.5089,-0.25,-1.9782],
// 3 15 -12.4245 -0.25 -1.7243 -11.5089 -0.25 -1.9782 -13.0478 -0.25 -0.9574
  [3,15,-12.4245,-0.25,-1.7243,-11.5089,-0.25,-1.9782,-13.0478,-0.25,-0.9574],
// 3 15 -13.7002 -0.25 -1.2068 -13.9138 -0.25 -0.5083 -15.5 -0.25 -5.5
  [3,15,-13.7002,-0.25,-1.2068,-13.9138,-0.25,-0.5083,-15.5,-0.25,-5.5],
// 4 15 -9.9314 -0.25 -0.606 -9.2193 -0.25 -0.7862 -9.3105 -0.25 1.4175 -10.0143 -0.25 1.2519
  [4,15,-9.9314,-0.25,-0.606,-9.2193,-0.25,-0.7862,-9.3105,-0.25,1.4175,-10.0143,-0.25,1.2519],
// 4 15 -9.2193 -0.25 -0.7862 -9.5331 -0.25 -1.5619 -8.9297 -0.25 -2.5 -6.8603 -0.25 2.8951
  [4,15,-9.2193,-0.25,-0.7862,-9.5331,-0.25,-1.5619,-8.9297,-0.25,-2.5,-6.8603,-0.25,2.8951],
// 4 15 -10.1458 -0.25 -1.2028 -9.9314 -0.25 -0.606 -11.5089 -0.25 -1.9782 -10.494 -0.25 -1.6324
  [4,15,-10.1458,-0.25,-1.2028,-9.9314,-0.25,-0.606,-11.5089,-0.25,-1.9782,-10.494,-0.25,-1.6324],
// 4 15 -13.2481 -0.25 0.2438 -13.198 -0.25 -0.4004 -9.9314 -0.25 -0.606 -10.0143 -0.25 1.2519
  [4,15,-13.2481,-0.25,0.2438,-13.198,-0.25,-0.4004,-9.9314,-0.25,-0.606,-10.0143,-0.25,1.2519],
// 4 15 -15.5 -0.25 -5.5 -13.9138 -0.25 -0.5083 -13.9851 -0.25 0.2401 -15.5 -0.25 5.5
  [4,15,-15.5,-0.25,-5.5,-13.9138,-0.25,-0.5083,-13.9851,-0.25,0.2401,-15.5,-0.25,5.5],
// 4 15 -8.1758 -0.25 -2.5 -4.6976 -0.25 -2.5 -5.3236 -0.25 -0.8644 -7.5837 -0.25 -0.8644
  [4,15,-8.1758,-0.25,-2.5,-4.6976,-0.25,-2.5,-5.3236,-0.25,-0.8644,-7.5837,-0.25,-0.8644],
// 3 15 -8.1758 -0.25 -2.5 -15.5 -0.25 -5.5 -4.6976 -0.25 -2.5
  [3,15,-8.1758,-0.25,-2.5,-15.5,-0.25,-5.5,-4.6976,-0.25,-2.5],
// 3 15 -1.3512 -0.25 -1.1477 -3.8846 -0.25 -2.5 -0.9513 -0.25 -2.0339
  [3,15,-1.3512,-0.25,-1.1477,-3.8846,-0.25,-2.5,-0.9513,-0.25,-2.0339],
// 3 15 -0.9513 -0.25 -2.0339 -3.8846 -0.25 -2.5 -0.4229 -0.25 -2.4518
  [3,15,-0.9513,-0.25,-2.0339,-3.8846,-0.25,-2.5,-0.4229,-0.25,-2.4518],
// 4 15 -3.8846 -0.25 -2.5 -4.6976 -0.25 -2.5 -15.5 -0.25 -5.5 0.273 -0.25 -2.5912
  [4,15,-3.8846,-0.25,-2.5,-4.6976,-0.25,-2.5,-15.5,-0.25,-5.5,0.273,-0.25,-2.5912],
// 3 15 0.273 -0.25 -2.5912 -0.4229 -0.25 -2.4518 -3.8846 -0.25 -2.5
  [3,15,0.273,-0.25,-2.5912,-0.4229,-0.25,-2.4518,-3.8846,-0.25,-2.5],
// 4 15 -0.4945 -0.25 -1.6059 0.273 -0.25 -2.0445 1.0407 -0.25 -1.6043 -0.7277 -0.25 -0.9447
  [4,15,-0.4945,-0.25,-1.6059,0.273,-0.25,-2.0445,1.0407,-0.25,-1.6043,-0.7277,-0.25,-0.9447],
// 4 15 4.5358 -0.25 -2.5 1.2529 -0.25 -2.274 0.273 -0.25 -2.5912 15.5 -0.25 -5.5
  [4,15,4.5358,-0.25,-2.5,1.2529,-0.25,-2.274,0.273,-0.25,-2.5912,15.5,-0.25,-5.5],
// 4 15 -7.377 -0.25 -0.2849 -5.5478 -0.25 -0.2849 -6.108 -0.25 1.2097 -6.7858 -0.25 1.2982
  [4,15,-7.377,-0.25,-0.2849,-5.5478,-0.25,-0.2849,-6.108,-0.25,1.2097,-6.7858,-0.25,1.2982],
// 4 15 -1.4845 -0.25 0.1606 -6.0897 -0.25 2.8951 -3.8846 -0.25 -2.5 -1.3512 -0.25 -1.1477
  [4,15,-1.4845,-0.25,0.1606,-6.0897,-0.25,2.8951,-3.8846,-0.25,-2.5,-1.3512,-0.25,-1.1477],
// 4 15 1.2739 -0.25 -0.9423 -0.8056 -0.25 0.1625 -0.7277 -0.25 -0.9447 1.0407 -0.25 -1.6043
  [4,15,1.2739,-0.25,-0.9423,-0.8056,-0.25,0.1625,-0.7277,-0.25,-0.9447,1.0407,-0.25,-1.6043],
// 4 15 1.982 -0.25 -0.6972 1.8359 -0.25 -1.3727 4.5358 -0.25 -2.5 3.2108 -0.25 0.9217
  [4,15,1.982,-0.25,-0.6972,1.8359,-0.25,-1.3727,4.5358,-0.25,-2.5,3.2108,-0.25,0.9217],
// 3 15 1.2529 -0.25 -2.274 4.5358 -0.25 -2.5 1.8359 -0.25 -1.3727
  [3,15,1.2529,-0.25,-2.274,4.5358,-0.25,-2.5,1.8359,-0.25,-1.3727],
// 3 15 -15.5 -0.25 -5.5 15.5 -0.25 -5.5 0.273 -0.25 -2.5912
  [3,15,-15.5,-0.25,-5.5,15.5,-0.25,-5.5,0.273,-0.25,-2.5912],
// 3 15 -1.4355 -0.25 1.024 -6.0897 -0.25 2.8951 -1.4845 -0.25 0.1606
  [3,15,-1.4355,-0.25,1.024,-6.0897,-0.25,2.8951,-1.4845,-0.25,0.1606],
// 3 15 -13.9048 -0.25 1.0295 -13.6634 -0.25 1.7111 -15.5 -0.25 5.5
  [3,15,-13.9048,-0.25,1.0295,-13.6634,-0.25,1.7111,-15.5,-0.25,5.5],
// 3 15 -13.9851 -0.25 0.2401 -13.9048 -0.25 1.0295 -15.5 -0.25 5.5
  [3,15,-13.9851,-0.25,0.2401,-13.9048,-0.25,1.0295,-15.5,-0.25,5.5],
// 4 15 -11.4549 -0.25 2.3776 -12.4929 -0.25 2.0797 -13.0791 -0.25 1.2794 -10.0143 -0.25 1.2519
  [4,15,-11.4549,-0.25,2.3776,-12.4929,-0.25,2.0797,-13.0791,-0.25,1.2794,-10.0143,-0.25,1.2519],
// 3 15 -10.0143 -0.25 1.2519 -13.0791 -0.25 1.2794 -13.2481 -0.25 0.2438
  [3,15,-10.0143,-0.25,1.2519,-13.0791,-0.25,1.2794,-13.2481,-0.25,0.2438],
// 3 15 -9.611 -0.25 2.0816 -9.3105 -0.25 1.4175 -6.8603 -0.25 2.8951
  [3,15,-9.611,-0.25,2.0816,-9.3105,-0.25,1.4175,-6.8603,-0.25,2.8951],
// 3 15 -15.5 -0.25 5.5 -12.7475 -0.25 2.6646 -12.1237 -0.25 2.9089
  [3,15,-15.5,-0.25,5.5,-12.7475,-0.25,2.6646,-12.1237,-0.25,2.9089],
// 3 15 -12.7475 -0.25 2.6646 -15.5 -0.25 5.5 -13.2736 -0.25 2.2634
  [3,15,-12.7475,-0.25,2.6646,-15.5,-0.25,5.5,-13.2736,-0.25,2.2634],
// 3 15 -15.5 -0.25 5.5 -12.1237 -0.25 2.9089 -11.44 -0.25 2.9905
  [3,15,-15.5,-0.25,5.5,-12.1237,-0.25,2.9089,-11.44,-0.25,2.9905],
// 3 15 -13.2736 -0.25 2.2634 -15.5 -0.25 5.5 -13.6634 -0.25 1.7111
  [3,15,-13.2736,-0.25,2.2634,-15.5,-0.25,5.5,-13.6634,-0.25,1.7111],
// 4 15 -11.44 -0.25 2.9905 -10.6951 -0.25 2.8874 -6.8603 -0.25 2.8951 -15.5 -0.25 5.5
  [4,15,-11.44,-0.25,2.9905,-10.6951,-0.25,2.8874,-6.8603,-0.25,2.8951,-15.5,-0.25,5.5],
// 3 15 -6.8603 -0.25 2.8951 -10.6951 -0.25 2.8874 -10.0793 -0.25 2.5779
  [3,15,-6.8603,-0.25,2.8951,-10.6951,-0.25,2.8874,-10.0793,-0.25,2.5779],
// 3 15 -9.611 -0.25 2.0816 -6.8603 -0.25 2.8951 -10.0793 -0.25 2.5779
  [3,15,-9.611,-0.25,2.0816,-6.8603,-0.25,2.8951,-10.0793,-0.25,2.5779],
// 3 15 -10.0143 -0.25 1.2519 -10.5581 -0.25 2.1091 -11.4549 -0.25 2.3776
  [3,15,-10.0143,-0.25,1.2519,-10.5581,-0.25,2.1091,-11.4549,-0.25,2.3776],
// 4 15 -15.5 -0.25 5.5 -6.8603 -0.25 2.8951 -6.0897 -0.25 2.8951 0.273 -0.25 2.9161
  [4,15,-15.5,-0.25,5.5,-6.8603,-0.25,2.8951,-6.0897,-0.25,2.8951,0.273,-0.25,2.9161],
// 3 15 -6.8603 -0.25 2.8951 -9.3105 -0.25 1.4175 -9.2193 -0.25 -0.7862
  [3,15,-6.8603,-0.25,2.8951,-9.3105,-0.25,1.4175,-9.2193,-0.25,-0.7862],
// 3 15 -6.4927 -0.25 2.328 -6.7858 -0.25 1.2982 -6.108 -0.25 1.2097
  [3,15,-6.4927,-0.25,2.328,-6.7858,-0.25,1.2982,-6.108,-0.25,1.2097],
// 3 15 -1.2879 -0.25 1.701 -6.0897 -0.25 2.8951 -1.4355 -0.25 1.024
  [3,15,-1.2879,-0.25,1.701,-6.0897,-0.25,2.8951,-1.4355,-0.25,1.024],
// 4 15 1.3518 -0.25 0.1625 -0.7203 -0.25 1.2815 -0.8056 -0.25 0.1625 1.2739 -0.25 -0.9423
  [4,15,1.3518,-0.25,0.1625,-0.7203,-0.25,1.2815,-0.8056,-0.25,0.1625,1.2739,-0.25,-0.9423],
// 4 15 3.2108 -0.25 1.5619 1.9093 -0.25 1.4353 2.0005 -0.25 0.8803 3.2108 -0.25 0.9217
  [4,15,3.2108,-0.25,1.5619,1.9093,-0.25,1.4353,2.0005,-0.25,0.8803,3.2108,-0.25,0.9217],
// 4 15 1.2741 -0.25 1.2704 1.0412 -0.25 1.9316 -0.7203 -0.25 1.2815 1.3518 -0.25 0.1625
  [4,15,1.2741,-0.25,1.2704,1.0412,-0.25,1.9316,-0.7203,-0.25,1.2815,1.3518,-0.25,0.1625],
// 3 15 2.0307 -0.25 0.1606 3.2108 -0.25 0.9217 2.0005 -0.25 0.8803
  [3,15,2.0307,-0.25,0.1606,3.2108,-0.25,0.9217,2.0005,-0.25,0.8803],
// 3 15 -6.0897 -0.25 2.8951 -1.2879 -0.25 1.701 -0.7033 -0.25 2.6007
  [3,15,-6.0897,-0.25,2.8951,-1.2879,-0.25,1.701,-0.7033,-0.25,2.6007],
// 3 15 -6.0897 -0.25 2.8951 -0.7033 -0.25 2.6007 0.273 -0.25 2.9161
  [3,15,-6.0897,-0.25,2.8951,-0.7033,-0.25,2.6007,0.273,-0.25,2.9161],
// 4 15 0.273 -0.25 2.9161 1.0354 -0.25 2.7412 4.7713 -0.25 2.9161 15.5 -0.25 5.5
  [4,15,0.273,-0.25,2.9161,1.0354,-0.25,2.7412,4.7713,-0.25,2.9161,15.5,-0.25,5.5],
// 4 15 4.7713 -0.25 2.9161 1.0354 -0.25 2.7412 1.5757 -0.25 2.2371 4.1825 -0.25 2.1947
  [4,15,4.7713,-0.25,2.9161,1.0354,-0.25,2.7412,1.5757,-0.25,2.2371,4.1825,-0.25,2.1947],
// 4 15 1.0412 -0.25 1.9316 0.2658 -0.25 2.3694 -0.4643 -0.25 1.983 -0.7203 -0.25 1.2815
  [4,15,1.0412,-0.25,1.9316,0.2658,-0.25,2.3694,-0.4643,-0.25,1.983,-0.7203,-0.25,1.2815],
// 4 15 1.5757 -0.25 2.2371 1.9093 -0.25 1.4353 3.2108 -0.25 1.5619 4.1825 -0.25 2.1947
  [4,15,1.5757,-0.25,2.2371,1.9093,-0.25,1.4353,3.2108,-0.25,1.5619,4.1825,-0.25,2.1947],
// 3 15 -15.5 -0.25 5.5 0.273 -0.25 2.9161 15.5 -0.25 5.5
  [3,15,-15.5,-0.25,5.5,0.273,-0.25,2.9161,15.5,-0.25,5.5],
// 3 15 1.982 -0.25 -0.6972 3.2108 -0.25 0.9217 2.0307 -0.25 0.1606
  [3,15,1.982,-0.25,-0.6972,3.2108,-0.25,0.9217,2.0307,-0.25,0.1606],
// 4 15 6.8961 -0.25 0.1606 5.1983 -0.25 2.9161 5.1983 -0.25 -2.5 7.0294 -0.25 -1.1477
  [4,15,6.8961,-0.25,0.1606,5.1983,-0.25,2.9161,5.1983,-0.25,-2.5,7.0294,-0.25,-1.1477],
// 4 15 5.1983 -0.25 -2.5 15.5 -0.25 -5.5 8.6536 -0.25 -2.5912 7.9577 -0.25 -2.4518
  [4,15,5.1983,-0.25,-2.5,15.5,-0.25,-5.5,8.6536,-0.25,-2.5912,7.9577,-0.25,-2.4518],
// 3 15 5.1983 -0.25 -2.5 7.4293 -0.25 -2.0339 7.0294 -0.25 -1.1477
  [3,15,5.1983,-0.25,-2.5,7.4293,-0.25,-2.0339,7.0294,-0.25,-1.1477],
// 3 15 5.1983 -0.25 -2.5 7.9577 -0.25 -2.4518 7.4293 -0.25 -2.0339
  [3,15,5.1983,-0.25,-2.5,7.9577,-0.25,-2.4518,7.4293,-0.25,-2.0339],
// 4 15 7.8862 -0.25 -1.6059 8.6536 -0.25 -2.0445 9.4213 -0.25 -1.6043 7.653 -0.25 -0.9447
  [4,15,7.8862,-0.25,-1.6059,8.6536,-0.25,-2.0445,9.4213,-0.25,-1.6043,7.653,-0.25,-0.9447],
// 4 15 9.6336 -0.25 -2.274 8.6536 -0.25 -2.5912 12.1336 -0.25 -2.473 11.5673 -0.25 -2.1184
  [4,15,9.6336,-0.25,-2.274,8.6536,-0.25,-2.5912,12.1336,-0.25,-2.473,11.5673,-0.25,-2.1184],
// 3 15 5.1983 -0.25 -2.5 4.5358 -0.25 -2.5 15.5 -0.25 -5.5
  [3,15,5.1983,-0.25,-2.5,4.5358,-0.25,-2.5,15.5,-0.25,-5.5],
// 4 15 7.653 -0.25 -0.9447 9.4213 -0.25 -1.6043 9.6545 -0.25 -0.9423 7.575 -0.25 0.1625
  [4,15,7.653,-0.25,-0.9447,9.4213,-0.25,-1.6043,9.6545,-0.25,-0.9423,7.575,-0.25,0.1625],
// 4 15 7.575 -0.25 0.1625 9.6545 -0.25 -0.9423 9.7324 -0.25 0.1625 7.6604 -0.25 1.2815
  [4,15,7.575,-0.25,0.1625,9.6545,-0.25,-0.9423,9.7324,-0.25,0.1625,7.6604,-0.25,1.2815],
// 4 15 11.0781 -0.25 -0.9394 10.3626 -0.25 -0.6972 10.2166 -0.25 -1.3727 11.2002 -0.25 -1.5873
  [4,15,11.0781,-0.25,-0.9394,10.3626,-0.25,-0.6972,10.2166,-0.25,-1.3727,11.2002,-0.25,-1.5873],
// 4 15 11.3449 -0.25 -0.0583 10.4113 -0.25 0.1606 10.3626 -0.25 -0.6972 11.0781 -0.25 -0.9394
  [4,15,11.3449,-0.25,-0.0583,10.4113,-0.25,0.1606,10.3626,-0.25,-0.6972,11.0781,-0.25,-0.9394],
// 4 15 11.2002 -0.25 -1.5873 10.2166 -0.25 -1.3727 9.6336 -0.25 -2.274 11.5673 -0.25 -2.1184
  [4,15,11.2002,-0.25,-1.5873,10.2166,-0.25,-1.3727,9.6336,-0.25,-2.274,11.5673,-0.25,-2.1184],
// 4 15 15.5 -0.25 -5.5 12.8544 -0.25 -2.5912 12.1336 -0.25 -2.473 8.6536 -0.25 -2.5912
  [4,15,15.5,-0.25,-5.5,12.8544,-0.25,-2.5912,12.1336,-0.25,-2.473,8.6536,-0.25,-2.5912],
// 4 15 11.8903 -0.25 -1.4898 12.2891 -0.25 -1.8995 12.8599 -0.25 -2.0445 11.757 -0.25 -0.9426
  [4,15,11.8903,-0.25,-1.4898,12.2891,-0.25,-1.8995,12.8599,-0.25,-2.0445,11.757,-0.25,-0.9426],
// 3 15 13.5752 -0.25 -2.4732 15.5 -0.25 -5.5 14.1415 -0.25 -2.1203
  [3,15,13.5752,-0.25,-2.4732,15.5,-0.25,-5.5,14.1415,-0.25,-2.1203],
// 3 15 15.5 -0.25 -5.5 13.5752 -0.25 -2.4732 12.8544 -0.25 -2.5912
  [3,15,15.5,-0.25,-5.5,13.5752,-0.25,-2.4732,12.8544,-0.25,-2.5912],
// 3 15 14.5085 -0.25 -1.5942 14.1415 -0.25 -2.1203 15.5 -0.25 -5.5
  [3,15,14.5085,-0.25,-1.5942,14.1415,-0.25,-2.1203,15.5,-0.25,-5.5],
// 4 15 12.8599 -0.25 -2.0445 13.6438 -0.25 -1.7397 13.9517 -0.25 -0.9646 12.8379 -0.25 0.1375
  [4,15,12.8599,-0.25,-2.0445,13.6438,-0.25,-1.7397,13.9517,-0.25,-0.9646,12.8379,-0.25,0.1375],
// 3 15 15.5 -0.25 -5.5 14.6307 -0.25 -0.9577 14.5085 -0.25 -1.5942
  [3,15,15.5,-0.25,-5.5,14.6307,-0.25,-0.9577,14.5085,-0.25,-1.5942],
// 4 15 12.8379 -0.25 0.1375 12.0631 -0.25 -0.1709 11.757 -0.25 -0.9426 12.8599 -0.25 -2.0445
  [4,15,12.8379,-0.25,0.1375,12.0631,-0.25,-0.1709,11.757,-0.25,-0.9426,12.8599,-0.25,-2.0445],
// 3 15 13.6348 -0.25 -0.1746 12.8379 -0.25 0.1375 13.9517 -0.25 -0.9646
  [3,15,13.6348,-0.25,-0.1746,12.8379,-0.25,0.1375,13.9517,-0.25,-0.9646],
// 4 15 14.372 -0.25 -0.097 14.6307 -0.25 -0.9577 15.5 -0.25 5.5 14.4113 -0.25 1.5071
  [4,15,14.372,-0.25,-0.097,14.6307,-0.25,-0.9577,15.5,-0.25,5.5,14.4113,-0.25,1.5071],
// 4 15 10.4113 -0.25 0.1606 11.3449 -0.25 -0.0583 11.4925 -0.25 0.8557 10.3811 -0.25 0.8803
  [4,15,10.4113,-0.25,0.1606,11.3449,-0.25,-0.0583,11.4925,-0.25,0.8557,10.3811,-0.25,0.8803],
// 3 15 14.6307 -0.25 -0.9577 15.5 -0.25 -5.5 15.5 -0.25 5.5
  [3,15,14.6307,-0.25,-0.9577,15.5,-0.25,-5.5,15.5,-0.25,5.5],
// 3 15 4.5358 -0.25 -2.5 3.9082 -0.25 1.2638 3.2108 -0.25 0.9217
  [3,15,4.5358,-0.25,-2.5,3.9082,-0.25,1.2638,3.2108,-0.25,0.9217],
// 3 15 4.5358 -0.25 -2.5 4.5358 -0.25 1.7201 3.9082 -0.25 1.2638
  [3,15,4.5358,-0.25,-2.5,4.5358,-0.25,1.7201,3.9082,-0.25,1.2638],
// 3 15 7.0927 -0.25 1.701 5.1983 -0.25 2.9161 6.9451 -0.25 1.024
  [3,15,7.0927,-0.25,1.701,5.1983,-0.25,2.9161,6.9451,-0.25,1.024],
// 4 15 7.6604 -0.25 1.2815 9.7324 -0.25 0.1625 9.6548 -0.25 1.2704 9.4218 -0.25 1.9316
  [4,15,7.6604,-0.25,1.2815,9.7324,-0.25,0.1625,9.6548,-0.25,1.2704,9.4218,-0.25,1.9316],
// 4 15 11.2933 -0.25 1.5253 10.29 -0.25 1.4353 10.3811 -0.25 0.8803 11.4925 -0.25 0.8557
  [4,15,11.2933,-0.25,1.5253,10.29,-0.25,1.4353,10.3811,-0.25,0.8803,11.4925,-0.25,0.8557],
// 3 15 5.1983 -0.25 2.9161 6.8961 -0.25 0.1606 6.9451 -0.25 1.024
  [3,15,5.1983,-0.25,2.9161,6.8961,-0.25,0.1606,6.9451,-0.25,1.024],
// 3 15 7.0927 -0.25 1.701 7.6773 -0.25 2.6007 5.1983 -0.25 2.9161
  [3,15,7.0927,-0.25,1.701,7.6773,-0.25,2.6007,5.1983,-0.25,2.9161],
// 4 15 5.1983 -0.25 2.9161 7.6773 -0.25 2.6007 8.6536 -0.25 2.9161 15.5 -0.25 5.5
  [4,15,5.1983,-0.25,2.9161,7.6773,-0.25,2.6007,8.6536,-0.25,2.9161,15.5,-0.25,5.5],
// 3 15 4.7713 -0.25 2.9161 5.1983 -0.25 2.9161 15.5 -0.25 5.5
  [3,15,4.7713,-0.25,2.9161,5.1983,-0.25,2.9161,15.5,-0.25,5.5],
// 4 15 12.2099 -0.25 2.8156 8.6536 -0.25 2.9161 9.416 -0.25 2.7412 11.7167 -0.25 2.5149
  [4,15,12.2099,-0.25,2.8156,8.6536,-0.25,2.9161,9.416,-0.25,2.7412,11.7167,-0.25,2.5149],
// 4 15 11.7167 -0.25 2.5149 9.416 -0.25 2.7412 9.9563 -0.25 2.2371 11.2933 -0.25 1.5253
  [4,15,11.7167,-0.25,2.5149,9.416,-0.25,2.7412,9.9563,-0.25,2.2371,11.2933,-0.25,1.5253],
// 4 15 9.4218 -0.25 1.9316 8.6464 -0.25 2.3694 7.9164 -0.25 1.983 7.6604 -0.25 1.2815
  [4,15,9.4218,-0.25,1.9316,8.6464,-0.25,2.3694,7.9164,-0.25,1.983,7.6604,-0.25,1.2815],
// 3 15 10.29 -0.25 1.4353 11.2933 -0.25 1.5253 9.9563 -0.25 2.2371
  [3,15,10.29,-0.25,1.4353,11.2933,-0.25,1.5253,9.9563,-0.25,2.2371],
// 4 15 11.9725 -0.25 1.5468 12.2181 -0.25 0.9225 12.8597 -0.25 0.68 12.8523 -0.25 2.3694
  [4,15,11.9725,-0.25,1.5468,12.2181,-0.25,0.9225,12.8597,-0.25,0.68,12.8523,-0.25,2.3694],
// 3 15 14.2149 -0.25 0.8538 13.6181 -0.25 0.4253 14.372 -0.25 -0.097
  [3,15,14.2149,-0.25,0.8538,13.6181,-0.25,0.4253,14.372,-0.25,-0.097],
// 4 15 13.7323 -0.25 1.51 13.4811 -0.25 2.1213 12.8597 -0.25 0.68 13.4885 -0.25 0.9206
  [4,15,13.7323,-0.25,1.51,13.4811,-0.25,2.1213,12.8597,-0.25,0.68,13.4885,-0.25,0.9206],
// 3 15 14.372 -0.25 -0.097 14.4113 -0.25 1.5071 14.2149 -0.25 0.8538
  [3,15,14.372,-0.25,-0.097,14.4113,-0.25,1.5071,14.2149,-0.25,0.8538],
// 4 15 12.8432 -0.25 2.9161 15.5 -0.25 5.5 8.6536 -0.25 2.9161 12.2099 -0.25 2.8156
  [4,15,12.8432,-0.25,2.9161,15.5,-0.25,5.5,8.6536,-0.25,2.9161,12.2099,-0.25,2.8156],
// 3 15 12.2218 -0.25 2.1269 11.9725 -0.25 1.5468 12.8523 -0.25 2.3694
  [3,15,12.2218,-0.25,2.1269,11.9725,-0.25,1.5468,12.8523,-0.25,2.3694],
// 3 15 13.4808 -0.25 2.8135 13.9806 -0.25 2.5059 15.5 -0.25 5.5
  [3,15,13.4808,-0.25,2.8135,13.9806,-0.25,2.5059,15.5,-0.25,5.5],
// 3 15 13.4808 -0.25 2.8135 15.5 -0.25 5.5 12.8432 -0.25 2.9161
  [3,15,13.4808,-0.25,2.8135,15.5,-0.25,5.5,12.8432,-0.25,2.9161],
// 3 15 14.4113 -0.25 1.5071 15.5 -0.25 5.5 13.9806 -0.25 2.5059
  [3,15,14.4113,-0.25,1.5071,15.5,-0.25,5.5,13.9806,-0.25,2.5059],
// 3 15 12.8597 -0.25 0.68 13.4811 -0.25 2.1213 12.8523 -0.25 2.3694
  [3,15,12.8597,-0.25,0.68,13.4811,-0.25,2.1213,12.8523,-0.25,2.3694],
// 3 15 11.4925 -0.25 0.8557 11.3449 -0.25 -0.0583 12.105 -0.25 0.4253
  [3,15,11.4925,-0.25,0.8557,11.3449,-0.25,-0.0583,12.105,-0.25,0.4253],
// 0 //
];
module ldraw_lib__4521703f(step=0, col=false, unit=2/5, alt=false, line=0.2, solid=!$preview)
    makepoly(ldraw_lib__4521703f(), step=step, col=col, unit=unit, alt=alt, line=line, solid=solid);
ldraw_lib__4521703f(line=0.2);
